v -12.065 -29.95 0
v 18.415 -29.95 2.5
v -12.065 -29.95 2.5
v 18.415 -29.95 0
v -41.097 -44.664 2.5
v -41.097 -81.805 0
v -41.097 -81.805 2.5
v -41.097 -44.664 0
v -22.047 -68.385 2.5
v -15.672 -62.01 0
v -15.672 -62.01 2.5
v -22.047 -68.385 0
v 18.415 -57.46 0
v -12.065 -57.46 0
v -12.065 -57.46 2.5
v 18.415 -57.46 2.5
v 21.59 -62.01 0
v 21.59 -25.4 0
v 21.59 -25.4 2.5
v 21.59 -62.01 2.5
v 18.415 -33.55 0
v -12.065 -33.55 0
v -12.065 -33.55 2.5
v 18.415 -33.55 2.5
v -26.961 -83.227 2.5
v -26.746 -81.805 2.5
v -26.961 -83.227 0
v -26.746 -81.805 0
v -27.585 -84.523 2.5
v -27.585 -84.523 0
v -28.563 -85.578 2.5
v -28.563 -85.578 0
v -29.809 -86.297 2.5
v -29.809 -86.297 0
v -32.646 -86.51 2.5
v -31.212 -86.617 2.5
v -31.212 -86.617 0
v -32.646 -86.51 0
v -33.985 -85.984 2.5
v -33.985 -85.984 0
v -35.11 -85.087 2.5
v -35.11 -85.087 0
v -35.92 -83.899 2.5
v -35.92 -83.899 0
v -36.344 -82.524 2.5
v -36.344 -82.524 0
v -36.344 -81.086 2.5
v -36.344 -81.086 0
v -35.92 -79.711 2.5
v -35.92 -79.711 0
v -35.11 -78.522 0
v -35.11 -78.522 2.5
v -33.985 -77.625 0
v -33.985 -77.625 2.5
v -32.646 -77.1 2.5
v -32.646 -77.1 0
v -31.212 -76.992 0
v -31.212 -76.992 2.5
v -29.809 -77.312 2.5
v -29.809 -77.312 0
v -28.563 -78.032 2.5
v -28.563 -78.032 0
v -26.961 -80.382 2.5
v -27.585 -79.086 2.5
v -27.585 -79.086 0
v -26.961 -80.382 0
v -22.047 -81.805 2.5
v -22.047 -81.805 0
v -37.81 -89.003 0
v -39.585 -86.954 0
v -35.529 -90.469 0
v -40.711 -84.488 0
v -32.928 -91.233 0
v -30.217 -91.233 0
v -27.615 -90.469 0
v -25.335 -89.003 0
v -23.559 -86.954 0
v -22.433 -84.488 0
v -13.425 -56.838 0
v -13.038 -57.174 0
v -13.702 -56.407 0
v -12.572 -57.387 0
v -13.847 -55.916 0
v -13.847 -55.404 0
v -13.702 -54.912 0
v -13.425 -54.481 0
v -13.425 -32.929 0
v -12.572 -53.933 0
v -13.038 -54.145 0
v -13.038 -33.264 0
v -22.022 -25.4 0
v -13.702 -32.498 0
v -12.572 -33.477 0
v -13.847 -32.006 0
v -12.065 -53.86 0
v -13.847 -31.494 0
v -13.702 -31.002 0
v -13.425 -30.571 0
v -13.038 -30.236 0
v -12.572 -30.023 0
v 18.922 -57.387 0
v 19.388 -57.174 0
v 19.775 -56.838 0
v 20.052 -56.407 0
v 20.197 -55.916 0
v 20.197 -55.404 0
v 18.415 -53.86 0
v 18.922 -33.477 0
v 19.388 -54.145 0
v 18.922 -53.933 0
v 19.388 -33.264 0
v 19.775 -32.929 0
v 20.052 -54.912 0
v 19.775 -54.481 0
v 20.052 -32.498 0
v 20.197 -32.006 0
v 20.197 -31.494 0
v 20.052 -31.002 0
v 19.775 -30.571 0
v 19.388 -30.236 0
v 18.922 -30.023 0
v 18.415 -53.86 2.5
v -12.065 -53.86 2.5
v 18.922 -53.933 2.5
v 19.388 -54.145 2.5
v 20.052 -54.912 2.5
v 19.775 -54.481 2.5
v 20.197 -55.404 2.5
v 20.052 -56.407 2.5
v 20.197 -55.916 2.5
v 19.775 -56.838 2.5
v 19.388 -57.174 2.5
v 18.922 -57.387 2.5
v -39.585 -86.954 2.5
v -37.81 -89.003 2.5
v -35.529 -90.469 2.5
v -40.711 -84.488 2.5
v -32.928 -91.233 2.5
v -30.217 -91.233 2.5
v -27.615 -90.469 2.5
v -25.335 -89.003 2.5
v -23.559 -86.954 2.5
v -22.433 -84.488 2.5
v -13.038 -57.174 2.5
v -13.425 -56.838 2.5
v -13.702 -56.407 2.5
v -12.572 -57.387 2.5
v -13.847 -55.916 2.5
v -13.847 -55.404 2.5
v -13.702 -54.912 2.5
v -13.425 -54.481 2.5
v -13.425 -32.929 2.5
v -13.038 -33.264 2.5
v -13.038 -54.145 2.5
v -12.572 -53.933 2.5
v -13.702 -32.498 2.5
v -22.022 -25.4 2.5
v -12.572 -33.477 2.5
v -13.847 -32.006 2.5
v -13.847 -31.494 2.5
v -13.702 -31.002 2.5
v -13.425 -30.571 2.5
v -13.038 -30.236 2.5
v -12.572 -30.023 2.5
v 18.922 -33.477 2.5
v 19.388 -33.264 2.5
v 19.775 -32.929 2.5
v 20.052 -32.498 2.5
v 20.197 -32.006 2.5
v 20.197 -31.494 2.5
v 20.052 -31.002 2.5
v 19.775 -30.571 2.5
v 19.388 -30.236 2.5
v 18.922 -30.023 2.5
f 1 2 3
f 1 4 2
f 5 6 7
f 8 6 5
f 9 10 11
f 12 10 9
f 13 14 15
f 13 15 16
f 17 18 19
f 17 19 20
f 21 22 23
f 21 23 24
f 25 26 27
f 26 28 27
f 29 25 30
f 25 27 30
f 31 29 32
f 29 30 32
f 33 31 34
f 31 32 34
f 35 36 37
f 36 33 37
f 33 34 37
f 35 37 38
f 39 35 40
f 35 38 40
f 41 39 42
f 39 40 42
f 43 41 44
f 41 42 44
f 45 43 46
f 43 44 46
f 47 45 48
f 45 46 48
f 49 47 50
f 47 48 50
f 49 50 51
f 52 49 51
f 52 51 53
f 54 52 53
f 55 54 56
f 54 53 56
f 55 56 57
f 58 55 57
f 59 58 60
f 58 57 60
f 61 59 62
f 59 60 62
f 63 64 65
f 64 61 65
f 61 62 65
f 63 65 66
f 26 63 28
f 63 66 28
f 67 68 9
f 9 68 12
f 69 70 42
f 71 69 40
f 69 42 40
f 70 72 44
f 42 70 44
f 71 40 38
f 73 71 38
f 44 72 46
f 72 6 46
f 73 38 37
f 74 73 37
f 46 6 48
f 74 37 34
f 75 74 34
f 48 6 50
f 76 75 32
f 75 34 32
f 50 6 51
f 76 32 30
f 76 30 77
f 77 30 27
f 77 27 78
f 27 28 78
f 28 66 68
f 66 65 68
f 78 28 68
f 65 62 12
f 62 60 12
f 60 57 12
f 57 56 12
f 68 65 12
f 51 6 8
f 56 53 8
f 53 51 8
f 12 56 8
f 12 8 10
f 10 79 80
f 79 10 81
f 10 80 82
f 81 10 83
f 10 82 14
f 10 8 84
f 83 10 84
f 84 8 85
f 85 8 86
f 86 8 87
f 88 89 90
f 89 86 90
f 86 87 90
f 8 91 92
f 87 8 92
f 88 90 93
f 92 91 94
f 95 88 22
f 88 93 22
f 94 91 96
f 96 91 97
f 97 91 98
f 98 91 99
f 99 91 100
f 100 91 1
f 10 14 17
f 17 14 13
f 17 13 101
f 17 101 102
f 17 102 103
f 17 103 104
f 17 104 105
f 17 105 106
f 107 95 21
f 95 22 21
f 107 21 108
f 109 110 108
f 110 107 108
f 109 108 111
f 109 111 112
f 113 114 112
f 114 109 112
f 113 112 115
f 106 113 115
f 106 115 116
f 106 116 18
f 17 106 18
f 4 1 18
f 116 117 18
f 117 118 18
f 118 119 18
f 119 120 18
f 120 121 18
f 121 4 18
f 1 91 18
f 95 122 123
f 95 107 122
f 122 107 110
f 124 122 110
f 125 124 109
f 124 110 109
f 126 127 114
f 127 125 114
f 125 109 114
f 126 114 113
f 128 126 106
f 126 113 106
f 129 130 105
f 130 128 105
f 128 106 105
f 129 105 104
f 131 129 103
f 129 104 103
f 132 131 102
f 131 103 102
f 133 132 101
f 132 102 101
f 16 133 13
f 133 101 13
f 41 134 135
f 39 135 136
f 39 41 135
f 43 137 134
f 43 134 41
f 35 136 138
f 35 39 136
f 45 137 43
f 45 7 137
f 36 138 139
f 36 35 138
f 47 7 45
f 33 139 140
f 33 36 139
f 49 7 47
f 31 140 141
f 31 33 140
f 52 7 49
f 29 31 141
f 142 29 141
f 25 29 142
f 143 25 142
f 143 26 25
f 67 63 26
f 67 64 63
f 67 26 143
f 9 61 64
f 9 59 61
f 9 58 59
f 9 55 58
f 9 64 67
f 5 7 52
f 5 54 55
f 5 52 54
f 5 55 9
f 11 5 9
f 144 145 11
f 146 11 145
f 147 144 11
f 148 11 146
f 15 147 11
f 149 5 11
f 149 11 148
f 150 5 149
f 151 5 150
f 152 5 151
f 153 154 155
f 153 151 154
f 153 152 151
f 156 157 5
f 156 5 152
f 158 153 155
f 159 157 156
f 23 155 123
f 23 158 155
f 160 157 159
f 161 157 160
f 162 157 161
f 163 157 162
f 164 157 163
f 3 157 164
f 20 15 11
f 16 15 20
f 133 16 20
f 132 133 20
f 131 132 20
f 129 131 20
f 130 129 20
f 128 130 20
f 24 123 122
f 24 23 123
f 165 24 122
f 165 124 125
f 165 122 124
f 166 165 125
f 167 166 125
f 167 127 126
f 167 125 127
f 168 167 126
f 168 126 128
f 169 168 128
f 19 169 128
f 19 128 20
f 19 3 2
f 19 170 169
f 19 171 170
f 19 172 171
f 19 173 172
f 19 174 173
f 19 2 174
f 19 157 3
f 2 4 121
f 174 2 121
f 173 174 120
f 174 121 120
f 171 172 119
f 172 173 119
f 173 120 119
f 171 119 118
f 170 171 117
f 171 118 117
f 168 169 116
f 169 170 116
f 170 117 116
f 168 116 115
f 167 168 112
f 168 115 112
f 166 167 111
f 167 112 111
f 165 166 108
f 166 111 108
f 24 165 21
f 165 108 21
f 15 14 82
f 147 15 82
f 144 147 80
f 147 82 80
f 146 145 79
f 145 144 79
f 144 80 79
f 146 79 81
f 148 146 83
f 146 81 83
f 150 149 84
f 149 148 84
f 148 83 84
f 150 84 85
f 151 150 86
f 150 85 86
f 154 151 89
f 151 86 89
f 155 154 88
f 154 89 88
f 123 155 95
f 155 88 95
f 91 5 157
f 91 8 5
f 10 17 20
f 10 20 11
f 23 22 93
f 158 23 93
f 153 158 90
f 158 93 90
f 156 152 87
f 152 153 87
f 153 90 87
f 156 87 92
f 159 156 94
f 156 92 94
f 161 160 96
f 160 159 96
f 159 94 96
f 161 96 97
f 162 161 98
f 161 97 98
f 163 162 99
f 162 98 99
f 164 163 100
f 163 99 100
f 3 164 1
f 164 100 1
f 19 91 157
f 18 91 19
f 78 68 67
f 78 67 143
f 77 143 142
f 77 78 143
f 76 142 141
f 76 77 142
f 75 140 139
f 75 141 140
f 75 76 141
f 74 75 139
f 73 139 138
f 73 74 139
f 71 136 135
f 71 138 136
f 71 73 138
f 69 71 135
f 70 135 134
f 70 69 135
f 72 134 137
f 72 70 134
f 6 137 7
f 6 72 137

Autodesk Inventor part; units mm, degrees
ref_plane "YZ Plane" through (0, 0, 0) normal (1, 0, 0) x (0, 1, 0)
ref_plane "XZ Plane" through (0, 0, 0) normal (0, 1, 0) x (-1, 0, 0)
ref_plane "XY Plane" through (0, 0, 0) normal (0, 0, 1) x (1, 0, 0)
ref_plane "Work Plane1" through (0, 0, 0) normal (0, 0, 1) x (1, 0, 0)
sketch "Sketch1" plane through (0, 0, 0) normal (0, 0, 1) x (1, 0, 0)
  line L0 (11.43, 0) -> (11.43, -63.5) construction
  line L1 (0, 0) -> (11.43, 0) construction
  line L2 (0, 0) -> (0, -63.5) construction
  line L3 (7.44, -34.7378) -> (0, -34.7378) construction
  circle A0 centre (5.715, -31.75) radius 1.7 construction
  line L4 (0, -63.5) -> (11.43, -63.5) construction
  circle A1 centre (5.715, -55.6597) radius 1.7 construction
  line L5 (21.59, -62.0097) -> (-15.6718, -62.0097)
  line L6 (-22.0218, -25.4) -> (21.59, -25.4)
  line L7 (21.59, -25.4) -> (21.59, -62.0097)
  line L8 (18.415, -31.75) -> (-12.065, -31.75) construction
  line L9 (18.415, -29.95) -> (-12.065, -29.95)
  line L10 (-12.065, -33.55) -> (18.415, -33.55)
  arc A2 (18.415, -33.55) -> (18.415, -29.95) centre (18.415, -31.75) ccw
  arc A3 (-12.065, -29.95) -> (-12.065, -33.55) centre (-12.065, -31.75) ccw
  line L11 (18.415, -55.6597) -> (-12.065, -55.6597) construction
  line L12 (18.415, -53.8597) -> (-12.065, -53.8597)
  line L13 (-12.065, -57.4597) -> (18.415, -57.4597)
  arc A4 (18.415, -57.4597) -> (18.415, -53.8597) centre (18.415, -55.6597) ccw
  arc A5 (-12.065, -53.8597) -> (-12.065, -57.4597) centre (-12.065, -55.6597) ccw
  circle A6 centre (-31.5722, -81.8048) radius 4.826
  arc A7 (-41.0972, -81.8048) -> (-22.0472, -81.8048) centre (-31.5722, -81.8048) ccw
  line L14 (-22.0218, -25.4) -> (-22.0218, -62.0097) construction
  line L15 (-41.0972, -81.8048) -> (-4.0676, -81.8048) construction
  line L16 (-41.0972, -44.6639) -> (-22.0218, -25.4)
  line L17 (-22.0472, -81.8048) -> (-22.0472, -68.3851)
  line L18 (-15.6718, -62.0097) -> (-22.0472, -68.3851)
  line L19 (-15.6718, -62.0097) -> (-6.6556, -62.0097) construction
  line L20 (21.59, -43.7048) -> (-43.6873, -43.7048) construction
  line L21 (21.59, -43.7048) -> (86.8673, -43.7048) construction
  line L22 (-41.0972, -81.8048) -> (-29.4827, -81.8048) construction
  line L23 (-41.0972, -81.8048) -> (-41.0972, -44.6639)
  line L24 (-41.0972, -81.8048) -> (-3.9563, -81.8048) construction
  point P0 (3.175, -31.75)
  point P1 (3.175, -55.6597)
extrude "Extrusion1" add sketch "Sketch1" along normal blind 2.5
properties part number "driven wheel arm angled"
